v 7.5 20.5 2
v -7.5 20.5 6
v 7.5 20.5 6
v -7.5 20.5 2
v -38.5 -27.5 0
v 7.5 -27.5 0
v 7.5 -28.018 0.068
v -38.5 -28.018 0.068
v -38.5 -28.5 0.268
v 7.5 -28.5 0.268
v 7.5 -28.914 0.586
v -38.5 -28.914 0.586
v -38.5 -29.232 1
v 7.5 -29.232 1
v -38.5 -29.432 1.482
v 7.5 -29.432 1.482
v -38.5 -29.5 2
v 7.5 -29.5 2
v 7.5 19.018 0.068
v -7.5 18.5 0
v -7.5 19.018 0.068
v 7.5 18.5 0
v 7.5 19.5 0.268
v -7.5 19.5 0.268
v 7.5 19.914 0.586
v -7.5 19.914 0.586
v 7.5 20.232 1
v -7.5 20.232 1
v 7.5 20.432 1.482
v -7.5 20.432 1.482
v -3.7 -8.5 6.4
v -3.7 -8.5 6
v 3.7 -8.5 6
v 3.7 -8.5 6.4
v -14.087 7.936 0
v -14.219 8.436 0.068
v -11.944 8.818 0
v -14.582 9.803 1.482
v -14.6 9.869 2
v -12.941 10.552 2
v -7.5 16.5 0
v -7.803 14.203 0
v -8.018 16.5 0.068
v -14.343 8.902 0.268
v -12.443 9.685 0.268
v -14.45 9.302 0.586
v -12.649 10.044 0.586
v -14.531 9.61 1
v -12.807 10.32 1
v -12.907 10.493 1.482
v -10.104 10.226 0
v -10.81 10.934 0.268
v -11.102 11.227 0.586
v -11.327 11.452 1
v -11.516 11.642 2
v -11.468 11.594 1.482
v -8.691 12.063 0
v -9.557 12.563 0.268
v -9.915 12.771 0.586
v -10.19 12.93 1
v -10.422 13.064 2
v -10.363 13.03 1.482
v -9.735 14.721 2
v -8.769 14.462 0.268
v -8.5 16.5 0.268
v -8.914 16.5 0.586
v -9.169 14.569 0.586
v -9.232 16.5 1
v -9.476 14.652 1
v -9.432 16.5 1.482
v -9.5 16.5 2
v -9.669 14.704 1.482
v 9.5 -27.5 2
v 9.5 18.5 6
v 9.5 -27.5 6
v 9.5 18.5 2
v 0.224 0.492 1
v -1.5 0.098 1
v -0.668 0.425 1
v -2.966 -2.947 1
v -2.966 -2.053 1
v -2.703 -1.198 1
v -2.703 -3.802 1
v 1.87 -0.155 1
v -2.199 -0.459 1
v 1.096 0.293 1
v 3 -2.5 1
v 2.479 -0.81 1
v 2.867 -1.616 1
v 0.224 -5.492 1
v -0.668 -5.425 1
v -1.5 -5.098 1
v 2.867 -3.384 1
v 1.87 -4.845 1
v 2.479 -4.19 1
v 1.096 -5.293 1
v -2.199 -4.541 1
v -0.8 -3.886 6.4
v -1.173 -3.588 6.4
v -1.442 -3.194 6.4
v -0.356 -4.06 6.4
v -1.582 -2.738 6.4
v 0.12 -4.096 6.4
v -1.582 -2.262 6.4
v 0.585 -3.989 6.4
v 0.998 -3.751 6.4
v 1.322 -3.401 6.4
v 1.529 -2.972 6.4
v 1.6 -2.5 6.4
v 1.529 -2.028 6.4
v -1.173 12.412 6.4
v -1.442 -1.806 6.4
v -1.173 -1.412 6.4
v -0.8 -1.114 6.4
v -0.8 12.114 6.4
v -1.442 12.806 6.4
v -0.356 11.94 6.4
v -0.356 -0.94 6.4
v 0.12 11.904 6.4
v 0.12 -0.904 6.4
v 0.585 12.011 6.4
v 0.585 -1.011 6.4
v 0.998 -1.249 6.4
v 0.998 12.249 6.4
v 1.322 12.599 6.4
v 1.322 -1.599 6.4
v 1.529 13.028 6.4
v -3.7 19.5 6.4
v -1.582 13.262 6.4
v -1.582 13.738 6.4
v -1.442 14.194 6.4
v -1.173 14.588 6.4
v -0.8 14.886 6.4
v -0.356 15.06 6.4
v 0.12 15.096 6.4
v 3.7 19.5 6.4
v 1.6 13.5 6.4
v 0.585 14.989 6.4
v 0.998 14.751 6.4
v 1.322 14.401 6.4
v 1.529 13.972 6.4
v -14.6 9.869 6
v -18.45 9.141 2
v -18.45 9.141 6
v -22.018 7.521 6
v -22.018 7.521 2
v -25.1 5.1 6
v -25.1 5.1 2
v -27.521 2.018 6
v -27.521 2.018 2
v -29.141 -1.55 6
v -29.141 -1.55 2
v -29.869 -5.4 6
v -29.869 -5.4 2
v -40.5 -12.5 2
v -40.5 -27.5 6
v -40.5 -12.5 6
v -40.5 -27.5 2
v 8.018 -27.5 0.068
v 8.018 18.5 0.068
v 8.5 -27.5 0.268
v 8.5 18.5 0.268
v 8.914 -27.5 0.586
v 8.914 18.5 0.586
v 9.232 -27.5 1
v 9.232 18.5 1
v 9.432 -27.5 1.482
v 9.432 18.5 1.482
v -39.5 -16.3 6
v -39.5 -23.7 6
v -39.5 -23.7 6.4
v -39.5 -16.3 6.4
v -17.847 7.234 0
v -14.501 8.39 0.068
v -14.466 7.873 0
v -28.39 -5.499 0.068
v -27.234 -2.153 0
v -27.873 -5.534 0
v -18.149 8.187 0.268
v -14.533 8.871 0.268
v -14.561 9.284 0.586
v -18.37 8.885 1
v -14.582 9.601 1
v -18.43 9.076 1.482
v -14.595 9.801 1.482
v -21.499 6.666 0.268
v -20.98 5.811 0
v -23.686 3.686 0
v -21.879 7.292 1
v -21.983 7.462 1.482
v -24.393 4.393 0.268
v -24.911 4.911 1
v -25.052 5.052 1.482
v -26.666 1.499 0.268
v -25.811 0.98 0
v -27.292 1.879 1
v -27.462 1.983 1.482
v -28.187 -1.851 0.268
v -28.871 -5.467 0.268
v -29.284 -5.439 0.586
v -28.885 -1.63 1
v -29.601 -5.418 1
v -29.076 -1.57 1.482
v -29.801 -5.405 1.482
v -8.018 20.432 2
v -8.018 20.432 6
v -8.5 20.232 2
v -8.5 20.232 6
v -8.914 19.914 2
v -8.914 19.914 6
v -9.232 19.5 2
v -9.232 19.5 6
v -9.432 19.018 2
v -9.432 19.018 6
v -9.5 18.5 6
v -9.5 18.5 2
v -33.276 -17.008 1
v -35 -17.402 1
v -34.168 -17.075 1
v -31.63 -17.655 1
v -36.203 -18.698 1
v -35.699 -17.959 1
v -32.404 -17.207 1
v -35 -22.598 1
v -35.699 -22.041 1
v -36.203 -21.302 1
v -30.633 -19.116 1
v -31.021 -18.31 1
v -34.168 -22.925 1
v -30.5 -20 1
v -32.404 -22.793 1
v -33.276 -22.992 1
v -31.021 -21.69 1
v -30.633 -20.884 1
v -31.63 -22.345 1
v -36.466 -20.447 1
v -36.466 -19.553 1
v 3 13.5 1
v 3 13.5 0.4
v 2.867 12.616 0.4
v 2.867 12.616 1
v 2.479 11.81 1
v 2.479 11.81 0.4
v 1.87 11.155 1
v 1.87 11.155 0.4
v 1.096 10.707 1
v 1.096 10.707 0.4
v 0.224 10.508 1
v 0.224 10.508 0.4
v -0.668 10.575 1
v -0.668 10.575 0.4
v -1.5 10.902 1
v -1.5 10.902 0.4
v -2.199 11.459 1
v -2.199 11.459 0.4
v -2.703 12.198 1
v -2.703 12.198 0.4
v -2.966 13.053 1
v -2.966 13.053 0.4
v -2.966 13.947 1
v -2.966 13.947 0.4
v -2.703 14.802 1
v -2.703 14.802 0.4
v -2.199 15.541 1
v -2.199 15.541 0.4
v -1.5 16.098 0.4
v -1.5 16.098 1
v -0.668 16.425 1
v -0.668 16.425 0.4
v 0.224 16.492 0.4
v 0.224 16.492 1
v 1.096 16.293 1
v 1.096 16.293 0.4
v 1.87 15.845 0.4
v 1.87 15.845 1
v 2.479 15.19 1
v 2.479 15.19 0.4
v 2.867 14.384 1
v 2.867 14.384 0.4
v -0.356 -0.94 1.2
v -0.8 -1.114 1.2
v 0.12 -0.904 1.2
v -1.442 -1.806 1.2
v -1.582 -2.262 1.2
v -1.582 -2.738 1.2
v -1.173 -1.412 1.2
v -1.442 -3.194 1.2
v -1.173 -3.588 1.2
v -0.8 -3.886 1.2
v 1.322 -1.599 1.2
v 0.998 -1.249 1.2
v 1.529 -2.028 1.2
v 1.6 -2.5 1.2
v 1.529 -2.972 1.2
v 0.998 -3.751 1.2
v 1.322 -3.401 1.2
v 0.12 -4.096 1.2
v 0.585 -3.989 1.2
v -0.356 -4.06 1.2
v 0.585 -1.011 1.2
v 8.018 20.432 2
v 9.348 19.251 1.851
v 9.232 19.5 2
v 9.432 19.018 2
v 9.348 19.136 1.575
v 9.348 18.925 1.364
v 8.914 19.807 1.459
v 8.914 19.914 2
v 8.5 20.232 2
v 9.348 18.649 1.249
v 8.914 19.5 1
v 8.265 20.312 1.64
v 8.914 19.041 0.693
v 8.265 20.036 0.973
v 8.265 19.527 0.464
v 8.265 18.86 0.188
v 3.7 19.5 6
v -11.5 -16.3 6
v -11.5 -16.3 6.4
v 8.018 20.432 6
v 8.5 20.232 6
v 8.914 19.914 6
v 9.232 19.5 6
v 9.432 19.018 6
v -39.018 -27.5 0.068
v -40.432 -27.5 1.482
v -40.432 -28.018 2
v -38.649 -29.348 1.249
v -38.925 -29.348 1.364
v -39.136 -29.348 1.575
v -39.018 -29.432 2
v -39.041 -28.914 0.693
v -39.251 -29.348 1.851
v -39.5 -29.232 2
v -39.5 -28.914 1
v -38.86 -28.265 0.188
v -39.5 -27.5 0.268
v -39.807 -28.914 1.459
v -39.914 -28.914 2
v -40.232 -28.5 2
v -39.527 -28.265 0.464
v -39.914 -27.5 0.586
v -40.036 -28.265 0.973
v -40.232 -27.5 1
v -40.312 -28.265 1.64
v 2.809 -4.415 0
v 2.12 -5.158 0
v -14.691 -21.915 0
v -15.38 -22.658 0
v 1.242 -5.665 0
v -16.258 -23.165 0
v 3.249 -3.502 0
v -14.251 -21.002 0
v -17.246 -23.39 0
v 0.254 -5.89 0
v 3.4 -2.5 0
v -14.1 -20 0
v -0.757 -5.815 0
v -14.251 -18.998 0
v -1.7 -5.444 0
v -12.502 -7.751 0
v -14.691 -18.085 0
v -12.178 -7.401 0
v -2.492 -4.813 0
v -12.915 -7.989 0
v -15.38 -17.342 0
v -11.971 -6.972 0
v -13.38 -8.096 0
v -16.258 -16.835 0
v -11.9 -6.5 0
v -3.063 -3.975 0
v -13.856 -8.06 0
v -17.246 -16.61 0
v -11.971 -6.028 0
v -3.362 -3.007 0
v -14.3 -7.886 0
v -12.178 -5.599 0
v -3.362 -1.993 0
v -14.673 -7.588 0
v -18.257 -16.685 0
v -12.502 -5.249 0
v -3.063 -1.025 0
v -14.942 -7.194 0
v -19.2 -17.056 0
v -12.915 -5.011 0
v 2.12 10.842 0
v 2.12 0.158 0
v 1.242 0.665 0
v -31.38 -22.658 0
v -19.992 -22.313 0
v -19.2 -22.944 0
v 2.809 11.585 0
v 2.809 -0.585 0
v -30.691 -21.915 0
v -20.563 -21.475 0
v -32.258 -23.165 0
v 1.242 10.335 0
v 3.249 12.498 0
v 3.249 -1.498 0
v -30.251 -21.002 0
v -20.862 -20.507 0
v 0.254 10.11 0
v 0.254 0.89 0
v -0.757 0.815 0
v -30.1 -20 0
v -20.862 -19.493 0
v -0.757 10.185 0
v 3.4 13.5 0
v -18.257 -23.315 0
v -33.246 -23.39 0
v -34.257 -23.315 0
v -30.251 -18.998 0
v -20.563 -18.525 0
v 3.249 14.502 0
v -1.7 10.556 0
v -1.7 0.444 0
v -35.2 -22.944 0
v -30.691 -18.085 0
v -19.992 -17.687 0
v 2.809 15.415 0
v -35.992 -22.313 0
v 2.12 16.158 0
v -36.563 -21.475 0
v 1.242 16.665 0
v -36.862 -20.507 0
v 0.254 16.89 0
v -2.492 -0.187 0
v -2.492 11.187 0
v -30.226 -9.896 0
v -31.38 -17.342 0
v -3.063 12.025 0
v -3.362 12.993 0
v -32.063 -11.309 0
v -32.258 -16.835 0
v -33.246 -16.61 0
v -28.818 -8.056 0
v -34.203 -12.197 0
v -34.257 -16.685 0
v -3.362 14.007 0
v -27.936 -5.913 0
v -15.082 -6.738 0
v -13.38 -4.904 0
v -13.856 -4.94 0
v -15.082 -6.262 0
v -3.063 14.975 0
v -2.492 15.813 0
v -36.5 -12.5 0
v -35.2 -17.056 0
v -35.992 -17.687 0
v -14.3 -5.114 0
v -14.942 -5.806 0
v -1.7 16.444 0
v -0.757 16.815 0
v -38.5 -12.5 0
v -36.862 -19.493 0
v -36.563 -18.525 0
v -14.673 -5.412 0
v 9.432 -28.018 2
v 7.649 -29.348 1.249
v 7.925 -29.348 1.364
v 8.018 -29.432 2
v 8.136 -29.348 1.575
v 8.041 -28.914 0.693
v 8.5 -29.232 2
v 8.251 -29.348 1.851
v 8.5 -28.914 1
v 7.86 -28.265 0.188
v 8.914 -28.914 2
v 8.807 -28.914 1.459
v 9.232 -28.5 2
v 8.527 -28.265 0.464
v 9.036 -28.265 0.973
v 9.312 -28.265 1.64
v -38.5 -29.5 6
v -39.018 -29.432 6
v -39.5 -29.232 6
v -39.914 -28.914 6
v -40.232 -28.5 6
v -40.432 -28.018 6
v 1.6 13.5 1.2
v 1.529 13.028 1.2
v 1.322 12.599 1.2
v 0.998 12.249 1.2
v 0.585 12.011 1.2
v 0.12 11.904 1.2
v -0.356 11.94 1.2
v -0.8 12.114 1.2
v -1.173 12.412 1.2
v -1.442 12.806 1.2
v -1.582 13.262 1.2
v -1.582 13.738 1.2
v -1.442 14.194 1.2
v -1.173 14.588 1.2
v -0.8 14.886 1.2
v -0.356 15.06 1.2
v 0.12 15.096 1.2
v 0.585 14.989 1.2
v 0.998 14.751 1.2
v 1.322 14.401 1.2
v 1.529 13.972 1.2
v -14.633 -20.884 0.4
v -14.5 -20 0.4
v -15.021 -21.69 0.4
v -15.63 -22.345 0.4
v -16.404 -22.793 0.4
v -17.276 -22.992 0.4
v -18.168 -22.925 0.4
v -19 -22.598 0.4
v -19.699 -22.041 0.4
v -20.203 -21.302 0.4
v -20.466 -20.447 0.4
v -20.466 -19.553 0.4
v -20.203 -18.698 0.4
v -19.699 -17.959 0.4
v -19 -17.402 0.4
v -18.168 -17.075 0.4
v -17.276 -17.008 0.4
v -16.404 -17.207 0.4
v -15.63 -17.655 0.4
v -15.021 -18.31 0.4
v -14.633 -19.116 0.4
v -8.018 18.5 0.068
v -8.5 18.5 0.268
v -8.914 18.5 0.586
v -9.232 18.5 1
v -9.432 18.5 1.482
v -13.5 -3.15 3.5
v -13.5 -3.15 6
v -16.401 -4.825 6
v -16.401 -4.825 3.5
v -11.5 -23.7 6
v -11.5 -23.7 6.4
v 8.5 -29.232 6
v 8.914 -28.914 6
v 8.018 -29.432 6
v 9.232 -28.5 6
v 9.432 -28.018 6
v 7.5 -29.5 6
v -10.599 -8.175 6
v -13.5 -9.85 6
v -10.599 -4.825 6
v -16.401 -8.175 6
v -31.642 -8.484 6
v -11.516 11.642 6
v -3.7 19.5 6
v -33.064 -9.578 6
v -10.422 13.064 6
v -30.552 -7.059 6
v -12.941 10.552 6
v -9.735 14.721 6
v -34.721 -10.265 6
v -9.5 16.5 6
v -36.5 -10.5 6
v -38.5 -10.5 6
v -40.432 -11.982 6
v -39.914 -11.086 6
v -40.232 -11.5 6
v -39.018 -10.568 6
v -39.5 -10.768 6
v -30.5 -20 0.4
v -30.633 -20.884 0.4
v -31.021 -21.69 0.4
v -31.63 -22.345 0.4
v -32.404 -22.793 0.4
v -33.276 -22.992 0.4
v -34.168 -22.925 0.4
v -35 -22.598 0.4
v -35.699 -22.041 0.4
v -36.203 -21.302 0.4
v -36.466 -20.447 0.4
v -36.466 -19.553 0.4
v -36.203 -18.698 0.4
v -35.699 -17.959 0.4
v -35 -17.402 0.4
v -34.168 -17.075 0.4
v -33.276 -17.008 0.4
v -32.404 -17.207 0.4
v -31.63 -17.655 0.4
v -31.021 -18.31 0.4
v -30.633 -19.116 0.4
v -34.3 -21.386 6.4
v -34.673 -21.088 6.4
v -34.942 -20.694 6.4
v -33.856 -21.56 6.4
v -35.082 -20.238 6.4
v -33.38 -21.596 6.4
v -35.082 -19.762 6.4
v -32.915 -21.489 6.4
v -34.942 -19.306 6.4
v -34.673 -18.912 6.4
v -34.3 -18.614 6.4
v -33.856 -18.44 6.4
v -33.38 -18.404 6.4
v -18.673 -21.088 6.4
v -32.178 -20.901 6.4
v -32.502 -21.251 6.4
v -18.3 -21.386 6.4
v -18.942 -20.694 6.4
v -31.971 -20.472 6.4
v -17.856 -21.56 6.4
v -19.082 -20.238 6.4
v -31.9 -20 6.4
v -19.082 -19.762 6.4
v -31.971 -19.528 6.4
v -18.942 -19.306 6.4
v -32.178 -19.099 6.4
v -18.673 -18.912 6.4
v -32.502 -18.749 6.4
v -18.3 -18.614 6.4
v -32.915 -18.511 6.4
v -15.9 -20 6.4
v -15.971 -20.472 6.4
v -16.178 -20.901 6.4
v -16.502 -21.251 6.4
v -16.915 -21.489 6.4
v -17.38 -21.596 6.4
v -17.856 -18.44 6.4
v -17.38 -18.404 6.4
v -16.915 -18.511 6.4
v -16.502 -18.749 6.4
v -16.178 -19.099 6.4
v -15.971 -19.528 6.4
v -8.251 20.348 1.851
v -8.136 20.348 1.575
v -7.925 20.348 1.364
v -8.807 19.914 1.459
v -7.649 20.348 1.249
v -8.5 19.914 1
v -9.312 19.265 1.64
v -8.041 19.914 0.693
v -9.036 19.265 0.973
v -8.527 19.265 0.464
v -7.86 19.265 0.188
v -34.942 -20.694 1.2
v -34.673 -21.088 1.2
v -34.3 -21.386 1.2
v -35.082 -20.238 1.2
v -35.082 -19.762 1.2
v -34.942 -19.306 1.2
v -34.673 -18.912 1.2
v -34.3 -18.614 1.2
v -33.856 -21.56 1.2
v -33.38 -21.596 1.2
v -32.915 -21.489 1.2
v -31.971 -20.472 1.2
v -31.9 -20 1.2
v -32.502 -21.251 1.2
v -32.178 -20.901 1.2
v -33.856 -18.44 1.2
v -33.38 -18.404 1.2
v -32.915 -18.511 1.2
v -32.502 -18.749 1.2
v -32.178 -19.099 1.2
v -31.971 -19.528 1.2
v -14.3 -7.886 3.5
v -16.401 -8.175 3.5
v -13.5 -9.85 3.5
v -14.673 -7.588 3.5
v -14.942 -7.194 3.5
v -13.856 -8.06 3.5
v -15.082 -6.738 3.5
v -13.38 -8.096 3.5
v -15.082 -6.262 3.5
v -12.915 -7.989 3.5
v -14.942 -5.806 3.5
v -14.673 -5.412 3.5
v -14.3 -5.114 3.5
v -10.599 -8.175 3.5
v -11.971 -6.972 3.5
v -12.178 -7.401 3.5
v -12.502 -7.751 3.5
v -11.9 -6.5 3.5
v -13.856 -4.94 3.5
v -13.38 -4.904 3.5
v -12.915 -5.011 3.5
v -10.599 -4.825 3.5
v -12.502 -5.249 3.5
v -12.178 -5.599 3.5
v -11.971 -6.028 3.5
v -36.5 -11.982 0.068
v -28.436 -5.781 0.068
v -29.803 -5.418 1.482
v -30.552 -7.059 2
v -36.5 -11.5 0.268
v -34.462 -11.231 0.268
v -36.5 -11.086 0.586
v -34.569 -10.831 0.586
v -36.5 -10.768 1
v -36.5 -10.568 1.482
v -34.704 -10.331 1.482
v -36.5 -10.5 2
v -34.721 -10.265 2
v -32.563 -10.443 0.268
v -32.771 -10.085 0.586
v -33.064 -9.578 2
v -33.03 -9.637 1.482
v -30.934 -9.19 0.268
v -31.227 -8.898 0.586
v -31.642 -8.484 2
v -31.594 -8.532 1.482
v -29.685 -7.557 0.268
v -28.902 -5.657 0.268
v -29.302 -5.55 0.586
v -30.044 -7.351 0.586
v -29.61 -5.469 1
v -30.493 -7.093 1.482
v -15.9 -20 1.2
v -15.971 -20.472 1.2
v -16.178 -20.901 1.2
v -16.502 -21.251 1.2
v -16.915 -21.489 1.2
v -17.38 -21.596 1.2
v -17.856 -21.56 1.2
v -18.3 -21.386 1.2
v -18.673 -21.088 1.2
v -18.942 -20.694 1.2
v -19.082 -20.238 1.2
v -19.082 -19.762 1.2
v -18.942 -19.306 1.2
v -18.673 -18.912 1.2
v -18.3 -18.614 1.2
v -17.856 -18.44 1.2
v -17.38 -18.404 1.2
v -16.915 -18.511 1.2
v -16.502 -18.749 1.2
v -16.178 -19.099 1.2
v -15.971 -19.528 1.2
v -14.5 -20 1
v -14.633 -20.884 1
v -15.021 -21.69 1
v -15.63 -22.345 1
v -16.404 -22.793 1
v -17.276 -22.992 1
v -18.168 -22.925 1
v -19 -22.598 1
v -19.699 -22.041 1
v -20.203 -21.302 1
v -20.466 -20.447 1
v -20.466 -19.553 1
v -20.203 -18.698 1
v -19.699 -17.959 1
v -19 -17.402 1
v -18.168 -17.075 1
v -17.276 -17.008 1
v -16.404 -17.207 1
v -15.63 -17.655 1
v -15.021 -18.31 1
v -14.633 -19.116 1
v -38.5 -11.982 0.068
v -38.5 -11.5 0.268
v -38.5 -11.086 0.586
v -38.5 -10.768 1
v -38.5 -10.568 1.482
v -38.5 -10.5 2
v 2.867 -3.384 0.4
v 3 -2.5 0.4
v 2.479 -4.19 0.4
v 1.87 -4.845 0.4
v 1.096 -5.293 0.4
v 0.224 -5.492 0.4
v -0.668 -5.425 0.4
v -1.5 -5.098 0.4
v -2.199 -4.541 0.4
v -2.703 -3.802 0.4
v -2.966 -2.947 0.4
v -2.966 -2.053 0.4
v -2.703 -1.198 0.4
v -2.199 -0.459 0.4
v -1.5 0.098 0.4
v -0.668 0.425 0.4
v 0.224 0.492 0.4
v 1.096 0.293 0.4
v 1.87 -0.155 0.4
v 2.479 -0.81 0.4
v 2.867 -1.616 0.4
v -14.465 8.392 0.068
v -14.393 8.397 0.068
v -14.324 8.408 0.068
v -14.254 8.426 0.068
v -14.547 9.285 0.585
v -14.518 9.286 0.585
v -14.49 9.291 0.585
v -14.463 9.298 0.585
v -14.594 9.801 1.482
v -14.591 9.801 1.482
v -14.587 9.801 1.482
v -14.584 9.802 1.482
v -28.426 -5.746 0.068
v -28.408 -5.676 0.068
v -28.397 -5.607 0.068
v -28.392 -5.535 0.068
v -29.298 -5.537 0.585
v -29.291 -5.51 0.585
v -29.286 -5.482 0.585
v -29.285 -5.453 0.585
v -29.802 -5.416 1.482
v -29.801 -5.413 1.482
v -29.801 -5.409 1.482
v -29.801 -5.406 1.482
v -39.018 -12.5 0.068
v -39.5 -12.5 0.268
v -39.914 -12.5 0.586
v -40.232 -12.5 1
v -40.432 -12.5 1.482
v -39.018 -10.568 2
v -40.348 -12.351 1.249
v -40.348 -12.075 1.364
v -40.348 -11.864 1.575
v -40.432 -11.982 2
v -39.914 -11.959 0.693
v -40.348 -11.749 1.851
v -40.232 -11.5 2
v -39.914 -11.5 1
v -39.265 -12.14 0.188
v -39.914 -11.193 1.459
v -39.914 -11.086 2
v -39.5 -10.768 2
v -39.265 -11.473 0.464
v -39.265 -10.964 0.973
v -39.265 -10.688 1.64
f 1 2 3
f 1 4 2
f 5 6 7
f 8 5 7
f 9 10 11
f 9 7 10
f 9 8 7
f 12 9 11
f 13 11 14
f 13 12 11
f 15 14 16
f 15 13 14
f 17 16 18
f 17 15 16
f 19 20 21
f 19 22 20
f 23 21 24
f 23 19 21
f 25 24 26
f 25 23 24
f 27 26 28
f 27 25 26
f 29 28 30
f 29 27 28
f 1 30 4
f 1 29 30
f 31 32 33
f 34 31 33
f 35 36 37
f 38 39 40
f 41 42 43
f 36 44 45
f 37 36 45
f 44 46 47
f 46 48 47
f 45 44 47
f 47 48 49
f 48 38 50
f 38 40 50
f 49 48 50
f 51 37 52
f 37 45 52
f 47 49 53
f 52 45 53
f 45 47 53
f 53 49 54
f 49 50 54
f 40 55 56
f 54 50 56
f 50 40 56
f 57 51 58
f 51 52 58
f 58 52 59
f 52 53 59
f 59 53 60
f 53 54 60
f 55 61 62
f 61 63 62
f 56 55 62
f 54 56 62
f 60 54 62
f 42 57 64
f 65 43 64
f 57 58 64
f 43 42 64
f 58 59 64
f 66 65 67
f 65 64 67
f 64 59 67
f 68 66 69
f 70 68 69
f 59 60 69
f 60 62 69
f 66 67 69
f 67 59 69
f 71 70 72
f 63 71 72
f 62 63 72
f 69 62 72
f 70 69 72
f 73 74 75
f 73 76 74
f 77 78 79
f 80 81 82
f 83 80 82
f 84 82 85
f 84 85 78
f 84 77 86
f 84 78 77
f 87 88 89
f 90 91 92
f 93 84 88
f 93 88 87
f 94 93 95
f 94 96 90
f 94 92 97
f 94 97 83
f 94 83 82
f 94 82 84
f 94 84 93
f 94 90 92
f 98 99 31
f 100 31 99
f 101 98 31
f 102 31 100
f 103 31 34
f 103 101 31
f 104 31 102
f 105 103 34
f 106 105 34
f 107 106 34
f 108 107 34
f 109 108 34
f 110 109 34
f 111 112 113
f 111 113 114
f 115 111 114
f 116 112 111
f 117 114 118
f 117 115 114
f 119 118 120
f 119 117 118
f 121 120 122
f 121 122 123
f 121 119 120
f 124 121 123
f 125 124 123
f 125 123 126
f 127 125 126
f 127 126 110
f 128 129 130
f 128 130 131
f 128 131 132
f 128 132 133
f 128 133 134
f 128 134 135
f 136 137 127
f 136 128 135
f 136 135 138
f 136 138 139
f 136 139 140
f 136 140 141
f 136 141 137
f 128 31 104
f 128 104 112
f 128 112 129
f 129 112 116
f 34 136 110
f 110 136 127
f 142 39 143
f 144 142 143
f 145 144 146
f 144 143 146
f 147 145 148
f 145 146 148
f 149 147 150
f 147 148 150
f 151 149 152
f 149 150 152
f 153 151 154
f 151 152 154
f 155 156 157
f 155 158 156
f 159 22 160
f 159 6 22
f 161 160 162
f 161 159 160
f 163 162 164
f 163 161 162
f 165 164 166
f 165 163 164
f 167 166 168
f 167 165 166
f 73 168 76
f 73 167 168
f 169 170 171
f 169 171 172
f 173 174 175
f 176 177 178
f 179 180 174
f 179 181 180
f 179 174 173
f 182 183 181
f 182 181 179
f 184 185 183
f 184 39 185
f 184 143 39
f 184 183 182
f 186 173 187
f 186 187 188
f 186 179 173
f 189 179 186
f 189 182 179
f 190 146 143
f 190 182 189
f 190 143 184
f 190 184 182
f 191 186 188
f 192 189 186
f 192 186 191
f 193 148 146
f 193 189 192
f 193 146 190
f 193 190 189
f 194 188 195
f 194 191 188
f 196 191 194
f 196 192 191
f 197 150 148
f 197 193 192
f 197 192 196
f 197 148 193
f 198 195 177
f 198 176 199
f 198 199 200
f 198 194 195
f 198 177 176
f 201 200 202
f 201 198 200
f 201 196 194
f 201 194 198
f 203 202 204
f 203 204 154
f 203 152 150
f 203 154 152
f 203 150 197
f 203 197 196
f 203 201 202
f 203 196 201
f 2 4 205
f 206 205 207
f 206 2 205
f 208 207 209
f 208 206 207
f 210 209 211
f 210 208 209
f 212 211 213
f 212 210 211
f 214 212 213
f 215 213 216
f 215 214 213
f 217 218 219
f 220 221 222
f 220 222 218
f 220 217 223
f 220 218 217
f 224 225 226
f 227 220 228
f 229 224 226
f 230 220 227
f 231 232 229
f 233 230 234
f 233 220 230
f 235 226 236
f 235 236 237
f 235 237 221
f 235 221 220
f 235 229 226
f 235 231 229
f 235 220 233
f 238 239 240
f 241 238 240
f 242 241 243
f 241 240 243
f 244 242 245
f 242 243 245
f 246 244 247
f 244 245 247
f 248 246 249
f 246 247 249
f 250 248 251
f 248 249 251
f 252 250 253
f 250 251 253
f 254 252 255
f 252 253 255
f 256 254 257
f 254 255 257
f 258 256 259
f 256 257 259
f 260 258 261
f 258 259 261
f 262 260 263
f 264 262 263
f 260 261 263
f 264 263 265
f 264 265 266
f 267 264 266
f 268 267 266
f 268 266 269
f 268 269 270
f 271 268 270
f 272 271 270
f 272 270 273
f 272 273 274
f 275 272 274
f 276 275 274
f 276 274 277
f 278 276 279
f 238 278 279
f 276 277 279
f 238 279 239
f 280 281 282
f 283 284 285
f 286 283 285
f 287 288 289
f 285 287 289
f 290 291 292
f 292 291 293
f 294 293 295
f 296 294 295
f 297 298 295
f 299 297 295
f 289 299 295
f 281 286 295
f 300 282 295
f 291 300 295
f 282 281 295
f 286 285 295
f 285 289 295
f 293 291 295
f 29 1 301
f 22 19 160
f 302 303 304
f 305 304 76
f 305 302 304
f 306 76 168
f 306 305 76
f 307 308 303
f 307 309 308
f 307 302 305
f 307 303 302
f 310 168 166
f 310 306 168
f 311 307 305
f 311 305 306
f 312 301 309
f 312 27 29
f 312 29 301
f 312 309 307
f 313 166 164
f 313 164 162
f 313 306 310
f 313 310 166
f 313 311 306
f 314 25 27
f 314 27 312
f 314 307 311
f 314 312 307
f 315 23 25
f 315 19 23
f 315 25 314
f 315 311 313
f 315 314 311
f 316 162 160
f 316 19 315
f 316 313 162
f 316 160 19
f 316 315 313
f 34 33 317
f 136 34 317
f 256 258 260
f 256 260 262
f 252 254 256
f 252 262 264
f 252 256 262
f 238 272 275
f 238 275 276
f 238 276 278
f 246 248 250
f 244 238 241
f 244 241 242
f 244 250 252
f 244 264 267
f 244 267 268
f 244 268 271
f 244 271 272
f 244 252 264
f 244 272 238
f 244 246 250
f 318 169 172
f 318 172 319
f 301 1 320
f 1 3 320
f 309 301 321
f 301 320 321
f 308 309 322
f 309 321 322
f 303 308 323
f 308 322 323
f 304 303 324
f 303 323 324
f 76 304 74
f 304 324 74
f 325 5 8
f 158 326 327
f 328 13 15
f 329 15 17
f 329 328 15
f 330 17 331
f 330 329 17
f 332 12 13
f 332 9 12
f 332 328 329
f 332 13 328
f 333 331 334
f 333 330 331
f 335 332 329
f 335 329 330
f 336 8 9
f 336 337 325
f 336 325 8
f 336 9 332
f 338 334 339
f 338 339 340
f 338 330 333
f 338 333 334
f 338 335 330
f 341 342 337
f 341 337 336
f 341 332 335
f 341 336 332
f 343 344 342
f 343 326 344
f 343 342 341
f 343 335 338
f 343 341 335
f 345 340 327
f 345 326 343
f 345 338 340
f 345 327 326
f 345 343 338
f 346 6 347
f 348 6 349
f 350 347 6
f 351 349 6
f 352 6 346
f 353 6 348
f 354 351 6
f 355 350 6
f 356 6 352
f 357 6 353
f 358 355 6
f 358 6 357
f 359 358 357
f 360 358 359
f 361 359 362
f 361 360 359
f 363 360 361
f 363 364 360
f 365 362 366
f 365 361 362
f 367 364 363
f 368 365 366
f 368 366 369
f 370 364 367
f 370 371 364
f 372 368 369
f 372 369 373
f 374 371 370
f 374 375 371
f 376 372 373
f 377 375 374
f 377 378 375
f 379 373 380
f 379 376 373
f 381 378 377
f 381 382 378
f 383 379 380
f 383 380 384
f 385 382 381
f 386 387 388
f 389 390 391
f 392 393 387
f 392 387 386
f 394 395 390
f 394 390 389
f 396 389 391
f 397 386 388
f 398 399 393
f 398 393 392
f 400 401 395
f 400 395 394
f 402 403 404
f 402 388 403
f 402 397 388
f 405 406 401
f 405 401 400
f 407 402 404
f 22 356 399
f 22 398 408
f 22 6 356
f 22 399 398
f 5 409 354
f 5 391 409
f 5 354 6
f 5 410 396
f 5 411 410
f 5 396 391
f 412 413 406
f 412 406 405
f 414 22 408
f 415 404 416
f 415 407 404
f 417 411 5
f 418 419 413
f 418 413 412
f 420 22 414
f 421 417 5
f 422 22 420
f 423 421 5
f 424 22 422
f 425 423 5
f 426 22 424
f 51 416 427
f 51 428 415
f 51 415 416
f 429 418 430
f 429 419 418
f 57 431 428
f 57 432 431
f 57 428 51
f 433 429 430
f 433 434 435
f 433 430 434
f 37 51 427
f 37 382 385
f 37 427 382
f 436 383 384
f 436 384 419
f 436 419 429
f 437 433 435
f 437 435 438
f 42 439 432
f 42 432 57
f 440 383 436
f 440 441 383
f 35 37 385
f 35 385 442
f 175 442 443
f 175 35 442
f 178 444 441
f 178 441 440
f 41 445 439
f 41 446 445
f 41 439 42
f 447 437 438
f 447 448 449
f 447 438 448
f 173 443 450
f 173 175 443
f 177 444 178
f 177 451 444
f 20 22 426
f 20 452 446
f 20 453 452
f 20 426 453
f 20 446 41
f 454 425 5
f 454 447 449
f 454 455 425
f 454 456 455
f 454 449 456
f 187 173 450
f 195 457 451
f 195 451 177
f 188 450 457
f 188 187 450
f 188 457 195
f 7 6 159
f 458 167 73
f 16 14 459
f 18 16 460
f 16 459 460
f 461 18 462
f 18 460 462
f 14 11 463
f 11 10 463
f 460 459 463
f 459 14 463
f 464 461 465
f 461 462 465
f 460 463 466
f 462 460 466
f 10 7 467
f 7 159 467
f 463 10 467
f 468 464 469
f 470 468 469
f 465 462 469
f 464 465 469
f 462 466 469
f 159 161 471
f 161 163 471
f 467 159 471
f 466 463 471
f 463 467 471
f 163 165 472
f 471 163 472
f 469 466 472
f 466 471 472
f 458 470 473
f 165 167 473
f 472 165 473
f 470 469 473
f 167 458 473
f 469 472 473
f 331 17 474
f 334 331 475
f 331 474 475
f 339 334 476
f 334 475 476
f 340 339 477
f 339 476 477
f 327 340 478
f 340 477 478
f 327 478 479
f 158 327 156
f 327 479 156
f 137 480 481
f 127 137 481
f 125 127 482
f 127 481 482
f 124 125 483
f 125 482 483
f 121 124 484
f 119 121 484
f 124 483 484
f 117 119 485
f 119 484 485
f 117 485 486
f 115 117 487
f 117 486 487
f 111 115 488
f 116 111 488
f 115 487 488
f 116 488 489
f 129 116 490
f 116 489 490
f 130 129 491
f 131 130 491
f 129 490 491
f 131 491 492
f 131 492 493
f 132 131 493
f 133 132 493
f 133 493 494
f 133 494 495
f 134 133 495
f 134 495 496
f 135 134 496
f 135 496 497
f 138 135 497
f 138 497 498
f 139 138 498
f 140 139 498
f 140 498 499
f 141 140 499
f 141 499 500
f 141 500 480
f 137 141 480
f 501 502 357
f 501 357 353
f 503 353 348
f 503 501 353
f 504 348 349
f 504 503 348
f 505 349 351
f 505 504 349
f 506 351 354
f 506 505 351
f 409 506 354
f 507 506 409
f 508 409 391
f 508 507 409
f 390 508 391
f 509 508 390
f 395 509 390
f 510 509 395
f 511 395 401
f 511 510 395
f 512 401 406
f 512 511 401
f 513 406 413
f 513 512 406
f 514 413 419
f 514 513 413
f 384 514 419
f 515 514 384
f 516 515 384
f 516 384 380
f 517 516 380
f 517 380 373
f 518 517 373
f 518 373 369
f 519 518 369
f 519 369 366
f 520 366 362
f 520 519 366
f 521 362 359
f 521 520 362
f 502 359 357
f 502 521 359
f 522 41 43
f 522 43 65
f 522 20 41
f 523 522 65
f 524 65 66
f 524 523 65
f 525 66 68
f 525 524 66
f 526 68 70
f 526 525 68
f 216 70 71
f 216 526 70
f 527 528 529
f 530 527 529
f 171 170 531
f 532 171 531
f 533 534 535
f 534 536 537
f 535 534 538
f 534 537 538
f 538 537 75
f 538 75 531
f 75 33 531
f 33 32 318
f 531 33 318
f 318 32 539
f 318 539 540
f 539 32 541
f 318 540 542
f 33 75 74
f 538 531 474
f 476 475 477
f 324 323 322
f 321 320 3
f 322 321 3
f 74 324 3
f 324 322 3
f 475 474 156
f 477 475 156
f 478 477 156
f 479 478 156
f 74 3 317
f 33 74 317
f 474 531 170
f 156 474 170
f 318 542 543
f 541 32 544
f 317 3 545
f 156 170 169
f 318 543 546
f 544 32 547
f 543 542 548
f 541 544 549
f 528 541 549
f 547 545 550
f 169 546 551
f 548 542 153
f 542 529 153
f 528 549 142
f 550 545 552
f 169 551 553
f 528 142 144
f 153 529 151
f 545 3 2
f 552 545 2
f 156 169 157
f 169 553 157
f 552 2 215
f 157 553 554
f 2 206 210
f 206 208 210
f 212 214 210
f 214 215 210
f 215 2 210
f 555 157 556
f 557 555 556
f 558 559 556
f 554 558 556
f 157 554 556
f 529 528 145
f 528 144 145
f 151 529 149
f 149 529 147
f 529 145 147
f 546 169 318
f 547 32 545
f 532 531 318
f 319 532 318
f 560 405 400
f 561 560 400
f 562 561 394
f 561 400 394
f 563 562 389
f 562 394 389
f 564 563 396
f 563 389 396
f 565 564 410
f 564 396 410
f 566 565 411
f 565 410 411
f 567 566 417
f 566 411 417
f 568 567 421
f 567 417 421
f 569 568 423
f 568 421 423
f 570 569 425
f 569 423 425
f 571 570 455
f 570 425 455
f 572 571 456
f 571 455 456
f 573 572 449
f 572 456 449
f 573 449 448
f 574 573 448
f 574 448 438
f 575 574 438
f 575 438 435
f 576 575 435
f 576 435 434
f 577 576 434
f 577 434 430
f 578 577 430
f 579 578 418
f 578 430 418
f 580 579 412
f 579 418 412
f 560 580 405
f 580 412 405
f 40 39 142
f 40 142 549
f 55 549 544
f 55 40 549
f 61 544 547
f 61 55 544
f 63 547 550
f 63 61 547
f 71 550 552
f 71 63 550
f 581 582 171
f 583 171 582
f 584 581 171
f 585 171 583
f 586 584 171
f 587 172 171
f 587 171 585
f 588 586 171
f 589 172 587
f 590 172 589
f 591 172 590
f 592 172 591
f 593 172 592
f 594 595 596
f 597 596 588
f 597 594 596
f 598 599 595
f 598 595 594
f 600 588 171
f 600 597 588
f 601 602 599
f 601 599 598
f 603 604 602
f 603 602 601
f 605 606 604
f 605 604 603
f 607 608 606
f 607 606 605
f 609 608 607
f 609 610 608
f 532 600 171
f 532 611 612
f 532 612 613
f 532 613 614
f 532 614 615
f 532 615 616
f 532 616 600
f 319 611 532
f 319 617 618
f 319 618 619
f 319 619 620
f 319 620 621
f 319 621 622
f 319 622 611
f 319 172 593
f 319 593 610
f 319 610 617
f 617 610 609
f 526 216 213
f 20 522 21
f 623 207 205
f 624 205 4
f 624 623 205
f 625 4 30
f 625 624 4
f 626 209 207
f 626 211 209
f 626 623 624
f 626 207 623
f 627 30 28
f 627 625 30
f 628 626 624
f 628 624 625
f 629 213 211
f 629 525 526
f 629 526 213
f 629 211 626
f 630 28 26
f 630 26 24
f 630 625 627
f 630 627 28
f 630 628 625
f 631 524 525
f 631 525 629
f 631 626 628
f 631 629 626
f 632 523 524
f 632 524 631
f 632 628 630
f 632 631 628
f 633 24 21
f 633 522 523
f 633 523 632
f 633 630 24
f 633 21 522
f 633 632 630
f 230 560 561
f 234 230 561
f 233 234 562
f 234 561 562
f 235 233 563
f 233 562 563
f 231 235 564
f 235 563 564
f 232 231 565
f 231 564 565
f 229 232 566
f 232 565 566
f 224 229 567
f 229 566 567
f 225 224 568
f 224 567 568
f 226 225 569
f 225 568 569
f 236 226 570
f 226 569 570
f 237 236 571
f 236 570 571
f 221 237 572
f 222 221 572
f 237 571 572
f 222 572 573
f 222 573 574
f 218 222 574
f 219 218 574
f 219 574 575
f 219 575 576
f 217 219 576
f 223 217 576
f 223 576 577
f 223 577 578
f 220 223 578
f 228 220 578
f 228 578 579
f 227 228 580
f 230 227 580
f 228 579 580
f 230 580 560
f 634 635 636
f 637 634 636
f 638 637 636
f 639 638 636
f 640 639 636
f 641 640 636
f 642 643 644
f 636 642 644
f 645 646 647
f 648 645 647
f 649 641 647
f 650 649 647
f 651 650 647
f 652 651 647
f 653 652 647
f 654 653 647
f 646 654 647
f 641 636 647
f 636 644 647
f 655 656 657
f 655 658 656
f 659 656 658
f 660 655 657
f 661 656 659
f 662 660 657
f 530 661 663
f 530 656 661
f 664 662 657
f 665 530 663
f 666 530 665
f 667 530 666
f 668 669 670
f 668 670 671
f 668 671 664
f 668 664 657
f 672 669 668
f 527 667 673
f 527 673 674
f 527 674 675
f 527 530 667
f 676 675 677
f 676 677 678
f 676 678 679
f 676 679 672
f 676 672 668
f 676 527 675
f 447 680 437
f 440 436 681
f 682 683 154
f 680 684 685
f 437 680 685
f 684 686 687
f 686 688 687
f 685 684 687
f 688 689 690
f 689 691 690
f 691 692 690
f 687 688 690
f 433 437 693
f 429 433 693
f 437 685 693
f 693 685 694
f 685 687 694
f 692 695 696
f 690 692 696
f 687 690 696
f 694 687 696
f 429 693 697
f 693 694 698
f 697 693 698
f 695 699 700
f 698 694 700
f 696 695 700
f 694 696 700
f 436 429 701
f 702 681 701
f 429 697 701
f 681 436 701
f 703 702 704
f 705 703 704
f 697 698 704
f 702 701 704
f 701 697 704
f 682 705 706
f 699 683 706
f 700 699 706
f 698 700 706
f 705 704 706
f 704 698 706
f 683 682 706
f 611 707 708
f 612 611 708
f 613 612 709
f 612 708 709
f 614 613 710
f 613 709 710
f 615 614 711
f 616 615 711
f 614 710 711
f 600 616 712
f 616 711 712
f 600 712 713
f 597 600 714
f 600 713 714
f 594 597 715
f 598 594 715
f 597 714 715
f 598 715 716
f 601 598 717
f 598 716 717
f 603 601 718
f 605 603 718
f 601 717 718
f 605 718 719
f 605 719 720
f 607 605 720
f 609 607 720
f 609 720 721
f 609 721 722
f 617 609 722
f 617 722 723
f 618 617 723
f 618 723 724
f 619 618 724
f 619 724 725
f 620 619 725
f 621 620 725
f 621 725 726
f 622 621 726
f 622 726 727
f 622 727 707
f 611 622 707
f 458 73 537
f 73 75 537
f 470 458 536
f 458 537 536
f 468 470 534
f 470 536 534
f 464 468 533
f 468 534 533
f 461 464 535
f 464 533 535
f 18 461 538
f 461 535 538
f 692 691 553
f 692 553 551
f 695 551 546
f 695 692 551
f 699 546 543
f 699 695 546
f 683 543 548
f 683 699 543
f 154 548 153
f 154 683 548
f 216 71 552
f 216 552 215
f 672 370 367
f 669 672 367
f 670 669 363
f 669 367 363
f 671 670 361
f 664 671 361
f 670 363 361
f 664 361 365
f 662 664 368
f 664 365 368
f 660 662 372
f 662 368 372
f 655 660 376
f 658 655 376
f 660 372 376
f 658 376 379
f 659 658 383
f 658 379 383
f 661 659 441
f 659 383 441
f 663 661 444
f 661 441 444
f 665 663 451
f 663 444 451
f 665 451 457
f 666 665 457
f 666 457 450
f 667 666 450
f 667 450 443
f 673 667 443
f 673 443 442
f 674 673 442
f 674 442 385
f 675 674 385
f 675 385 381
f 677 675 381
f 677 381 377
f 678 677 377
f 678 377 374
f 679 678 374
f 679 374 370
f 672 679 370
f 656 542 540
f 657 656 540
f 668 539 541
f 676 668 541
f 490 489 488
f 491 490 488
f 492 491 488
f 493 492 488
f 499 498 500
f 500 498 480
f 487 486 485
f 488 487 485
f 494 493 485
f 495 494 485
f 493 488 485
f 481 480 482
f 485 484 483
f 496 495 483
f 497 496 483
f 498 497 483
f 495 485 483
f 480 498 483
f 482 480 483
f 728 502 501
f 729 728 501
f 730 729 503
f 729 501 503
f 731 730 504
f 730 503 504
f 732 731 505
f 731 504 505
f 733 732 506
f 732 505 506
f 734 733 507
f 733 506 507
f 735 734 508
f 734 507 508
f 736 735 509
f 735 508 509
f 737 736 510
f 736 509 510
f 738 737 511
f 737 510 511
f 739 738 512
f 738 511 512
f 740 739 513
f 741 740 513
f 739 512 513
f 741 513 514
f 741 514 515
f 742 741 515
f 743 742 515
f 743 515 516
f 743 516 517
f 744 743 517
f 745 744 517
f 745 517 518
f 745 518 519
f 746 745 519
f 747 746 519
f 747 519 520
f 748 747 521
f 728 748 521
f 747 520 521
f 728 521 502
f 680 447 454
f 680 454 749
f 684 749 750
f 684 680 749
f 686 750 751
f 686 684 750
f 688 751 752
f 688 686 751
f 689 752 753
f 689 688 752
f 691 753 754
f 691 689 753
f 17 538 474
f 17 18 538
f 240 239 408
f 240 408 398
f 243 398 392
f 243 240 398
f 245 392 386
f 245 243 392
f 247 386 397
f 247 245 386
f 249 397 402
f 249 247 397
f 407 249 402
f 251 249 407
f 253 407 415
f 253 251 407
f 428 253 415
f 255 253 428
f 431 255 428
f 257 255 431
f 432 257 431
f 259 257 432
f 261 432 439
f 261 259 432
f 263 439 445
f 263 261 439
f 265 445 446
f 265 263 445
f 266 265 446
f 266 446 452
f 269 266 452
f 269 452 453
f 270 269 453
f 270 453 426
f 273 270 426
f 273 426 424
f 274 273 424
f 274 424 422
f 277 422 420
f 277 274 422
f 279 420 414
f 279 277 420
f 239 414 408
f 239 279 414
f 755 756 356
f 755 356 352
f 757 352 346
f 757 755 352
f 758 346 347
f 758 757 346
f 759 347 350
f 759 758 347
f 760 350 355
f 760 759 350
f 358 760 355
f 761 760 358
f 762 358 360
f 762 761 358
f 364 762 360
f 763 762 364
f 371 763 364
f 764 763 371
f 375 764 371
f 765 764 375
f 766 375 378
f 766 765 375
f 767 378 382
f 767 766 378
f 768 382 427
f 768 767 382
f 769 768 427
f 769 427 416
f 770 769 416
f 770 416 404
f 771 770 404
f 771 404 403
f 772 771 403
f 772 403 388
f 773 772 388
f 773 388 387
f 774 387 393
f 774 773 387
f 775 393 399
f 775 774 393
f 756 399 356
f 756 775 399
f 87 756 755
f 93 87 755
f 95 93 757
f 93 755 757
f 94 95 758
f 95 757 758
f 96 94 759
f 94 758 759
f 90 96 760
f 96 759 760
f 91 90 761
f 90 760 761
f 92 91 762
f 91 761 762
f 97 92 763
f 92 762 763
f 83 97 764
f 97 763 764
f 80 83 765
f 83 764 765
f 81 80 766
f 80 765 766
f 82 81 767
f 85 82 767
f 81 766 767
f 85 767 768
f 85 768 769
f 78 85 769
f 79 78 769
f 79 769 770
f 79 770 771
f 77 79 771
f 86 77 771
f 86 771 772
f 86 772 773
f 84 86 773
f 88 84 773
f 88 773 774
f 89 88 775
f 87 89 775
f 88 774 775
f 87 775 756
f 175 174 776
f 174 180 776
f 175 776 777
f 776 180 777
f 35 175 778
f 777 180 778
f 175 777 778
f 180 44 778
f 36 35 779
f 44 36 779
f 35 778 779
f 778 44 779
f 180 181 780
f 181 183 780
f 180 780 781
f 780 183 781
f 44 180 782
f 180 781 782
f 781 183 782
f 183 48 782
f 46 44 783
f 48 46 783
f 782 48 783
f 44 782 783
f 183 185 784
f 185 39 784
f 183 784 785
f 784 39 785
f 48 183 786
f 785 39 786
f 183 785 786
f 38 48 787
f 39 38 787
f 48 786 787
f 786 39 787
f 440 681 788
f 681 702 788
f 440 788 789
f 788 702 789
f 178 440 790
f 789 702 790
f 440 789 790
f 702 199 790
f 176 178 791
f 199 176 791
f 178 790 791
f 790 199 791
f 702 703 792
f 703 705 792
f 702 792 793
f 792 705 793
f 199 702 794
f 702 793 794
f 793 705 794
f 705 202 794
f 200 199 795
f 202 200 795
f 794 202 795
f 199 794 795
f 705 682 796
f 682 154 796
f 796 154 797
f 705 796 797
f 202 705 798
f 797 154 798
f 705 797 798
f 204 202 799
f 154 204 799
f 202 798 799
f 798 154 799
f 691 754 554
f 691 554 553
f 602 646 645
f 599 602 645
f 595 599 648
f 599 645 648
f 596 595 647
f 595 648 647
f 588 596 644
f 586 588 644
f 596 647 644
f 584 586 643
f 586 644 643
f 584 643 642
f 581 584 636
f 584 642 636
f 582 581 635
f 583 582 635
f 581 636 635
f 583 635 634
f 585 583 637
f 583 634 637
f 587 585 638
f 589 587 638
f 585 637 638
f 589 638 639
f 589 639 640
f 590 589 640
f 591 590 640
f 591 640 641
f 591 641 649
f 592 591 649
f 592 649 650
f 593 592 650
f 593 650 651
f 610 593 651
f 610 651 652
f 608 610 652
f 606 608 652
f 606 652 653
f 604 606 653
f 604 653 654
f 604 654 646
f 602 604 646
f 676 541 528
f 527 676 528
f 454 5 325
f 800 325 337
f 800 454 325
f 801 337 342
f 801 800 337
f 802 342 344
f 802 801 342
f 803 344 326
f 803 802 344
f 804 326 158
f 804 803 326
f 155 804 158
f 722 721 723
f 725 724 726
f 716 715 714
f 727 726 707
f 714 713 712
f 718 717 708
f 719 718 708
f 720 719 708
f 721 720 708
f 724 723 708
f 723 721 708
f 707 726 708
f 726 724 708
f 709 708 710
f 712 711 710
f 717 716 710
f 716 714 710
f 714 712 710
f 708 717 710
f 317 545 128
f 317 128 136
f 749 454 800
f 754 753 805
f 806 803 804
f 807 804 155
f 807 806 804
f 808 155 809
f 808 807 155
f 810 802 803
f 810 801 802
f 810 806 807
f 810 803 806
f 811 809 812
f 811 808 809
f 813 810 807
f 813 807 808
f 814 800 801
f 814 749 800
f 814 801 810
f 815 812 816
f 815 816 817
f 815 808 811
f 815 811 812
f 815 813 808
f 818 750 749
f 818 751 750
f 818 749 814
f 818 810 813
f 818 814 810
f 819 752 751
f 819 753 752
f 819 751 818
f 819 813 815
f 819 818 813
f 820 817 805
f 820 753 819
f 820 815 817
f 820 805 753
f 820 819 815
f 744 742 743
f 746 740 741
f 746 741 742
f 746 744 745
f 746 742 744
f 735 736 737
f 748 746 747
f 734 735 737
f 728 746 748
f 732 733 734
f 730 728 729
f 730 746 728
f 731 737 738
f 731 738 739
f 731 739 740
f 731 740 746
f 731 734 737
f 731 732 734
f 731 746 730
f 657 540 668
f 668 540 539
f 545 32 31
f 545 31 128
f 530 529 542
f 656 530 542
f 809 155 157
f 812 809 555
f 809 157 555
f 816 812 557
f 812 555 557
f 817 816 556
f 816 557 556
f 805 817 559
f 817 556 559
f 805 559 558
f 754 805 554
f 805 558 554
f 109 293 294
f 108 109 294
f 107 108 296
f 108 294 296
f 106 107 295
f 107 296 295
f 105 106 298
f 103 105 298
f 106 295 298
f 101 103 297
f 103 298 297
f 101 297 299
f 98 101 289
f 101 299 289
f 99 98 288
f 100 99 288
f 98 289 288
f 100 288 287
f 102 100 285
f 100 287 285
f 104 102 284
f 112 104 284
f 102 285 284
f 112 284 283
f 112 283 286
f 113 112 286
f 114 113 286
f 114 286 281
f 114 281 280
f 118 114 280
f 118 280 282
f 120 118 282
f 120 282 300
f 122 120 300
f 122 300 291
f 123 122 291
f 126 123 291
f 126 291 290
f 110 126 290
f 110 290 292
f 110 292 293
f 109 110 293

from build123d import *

# Parameters (mm, degrees)
PAD_DEPTH       = 6
SKETCH_W        = 28
SKETCH_H        = 7.4
SKETCH_W_2      = 7.4
SKETCH_H_2      = 28
PAD001_DEPTH    = 0.4
SKETCH002_R     = 1.6
POCKET_DEPTH    = 6.401
POCKET001_DEPTH = 2.5
SKETCH004_R     = 3
POCKET002_DEPTH = 1
SKETCH005_R     = 3
PAD002_DEPTH    = 0.2
CHAMFER_SIZE    = 0.4
FILLET_R        = 2


with BuildPart() as part:
    # Sketch001 → Pad (new body)
    with BuildSketch(Plane(origin=(0, -20, 0), x_dir=(1, 0, 0), z_dir=(0, 0, 1))):
        with BuildLine():
            Line((-9.5, 40.5), (9.5, 40.5))
            Line((9.5, 40.5), (9.5, -9.5))
            Line((9.5, -9.5), (-40.5, -9.5))
            Line((-40.5, -9.5), (-40.5, 9.5))
            Line((-40.5, 9.5), (-36.5, 9.5))
            ThreePointArc((-36.5, 9.5), (-32.317125, 10.922441), (-29.868569, 14.599988))
            ThreePointArc((-14.599988, 29.868569), (-25.100431, 25.100431), (-29.868569, 14.599988))
            ThreePointArc((-14.599988, 29.868569), (-10.922441, 32.317125), (-9.5, 36.5))
            Line((-9.5, 36.5), (-9.5, 40.5))
        make_face()
    extrude(amount=PAD_DEPTH)

    # Sketch → Pad001 (new body)
    with BuildSketch(Plane(origin=(0, -20, 6), x_dir=(1, 0, 0), z_dir=(0, 0, 1))):
        with Locations((-25.5, 0)):
            Rectangle(SKETCH_W, SKETCH_H)
        with Locations((0, 25.5)):
            Rectangle(SKETCH_W_2, SKETCH_H_2)
    extrude(amount=PAD001_DEPTH)

    # Sketch002 → Pocket (cut, through all)
    with BuildSketch(Plane(origin=(0, -20, 0), x_dir=(1, 0, 0), z_dir=(0, 0, -1))):
        with Locations((-33.5, 0)):
            Circle(SKETCH002_R)
        with Locations((-17.5, 0)):
            Circle(SKETCH002_R)
        with Locations((0, -17.5)):
            Circle(SKETCH002_R)
        with Locations((0, -33.5)):
            Circle(SKETCH002_R)
        with Locations((-13.5, -13.5)):
            Circle(SKETCH002_R)
    extrude(amount=-POCKET_DEPTH, mode=Mode.SUBTRACT)

    # Sketch003 → Pocket001 (cut)
    with BuildSketch(Plane(origin=(0, -20, 6), x_dir=(1, 0, 0), z_dir=(0, 0, 1))):
        Polygon((-10.598815, 11.825), (-10.598815, 15.175), (-13.5, 16.85), (-16.401185, 15.175), (-16.401185, 11.825), (-13.5, 10.15), align=None)
    extrude(amount=-POCKET001_DEPTH, mode=Mode.SUBTRACT)

    # Sketch004 → Pocket002 (cut)
    with BuildSketch(Plane(origin=(0, -20, 0), x_dir=(1, 0, 0), z_dir=(0, 0, -1))):
        with Locations((-33.5, 0)):
            Circle(SKETCH004_R)
        with Locations((-17.5, 0)):
            Circle(SKETCH004_R)
        with Locations((0, -17.5)):
            Circle(SKETCH004_R)
        with Locations((0, -33.5)):
            Circle(SKETCH004_R)
    extrude(amount=-POCKET002_DEPTH, mode=Mode.SUBTRACT)

    # Sketch005 → Pad002 (new body)
    with BuildSketch(Plane(origin=(0, -20, 1), x_dir=(1, 0, 0), z_dir=(0, 0, -1))):
        with Locations((-33.5, 0)):
            Circle(SKETCH005_R)
        with Locations((-17.5, 0)):
            Circle(SKETCH005_R)
        with Locations((0, -17.5)):
            Circle(SKETCH005_R)
        with Locations((0, -33.5)):
            Circle(SKETCH005_R)
    extrude(amount=-PAD002_DEPTH)

    # Chamfer
    chamfer_edges = [part.edges().sort_by_distance(p)[0] for p in [
        (-20.5, -20, 0),
        (-36.5, -20, 0),
        (-3, -2.5, 0),
        (-3, 13.5, 0),
    ]]
    chamfer(chamfer_edges, length=CHAMFER_SIZE)

    # Fillet
    fillet_edges = [part.edges().sort_by_distance(p)[0] for p in [
        (-32.317125, -9.077559, 0),
        (-38.5, -10.5, 0),
        (-40.5, -20, 0),
        (-40.5, -10.5, 3),
        (-25.100431, 5.100431, 0),
        (-10.922441, 12.317125, 0),
        (-9.5, 18.5, 0),
        (-9.5, 20.5, 3),
        (0, 20.5, 0),
        (9.5, 20.5, 3),
        (9.5, -4.5, 0),
        (-15.5, -29.5, 0),
        (-40.5, -29.5, 3),
        (9.5, -29.5, 3),
    ]]
    fillet(fillet_edges, radius=FILLET_R)


solid = part.part
